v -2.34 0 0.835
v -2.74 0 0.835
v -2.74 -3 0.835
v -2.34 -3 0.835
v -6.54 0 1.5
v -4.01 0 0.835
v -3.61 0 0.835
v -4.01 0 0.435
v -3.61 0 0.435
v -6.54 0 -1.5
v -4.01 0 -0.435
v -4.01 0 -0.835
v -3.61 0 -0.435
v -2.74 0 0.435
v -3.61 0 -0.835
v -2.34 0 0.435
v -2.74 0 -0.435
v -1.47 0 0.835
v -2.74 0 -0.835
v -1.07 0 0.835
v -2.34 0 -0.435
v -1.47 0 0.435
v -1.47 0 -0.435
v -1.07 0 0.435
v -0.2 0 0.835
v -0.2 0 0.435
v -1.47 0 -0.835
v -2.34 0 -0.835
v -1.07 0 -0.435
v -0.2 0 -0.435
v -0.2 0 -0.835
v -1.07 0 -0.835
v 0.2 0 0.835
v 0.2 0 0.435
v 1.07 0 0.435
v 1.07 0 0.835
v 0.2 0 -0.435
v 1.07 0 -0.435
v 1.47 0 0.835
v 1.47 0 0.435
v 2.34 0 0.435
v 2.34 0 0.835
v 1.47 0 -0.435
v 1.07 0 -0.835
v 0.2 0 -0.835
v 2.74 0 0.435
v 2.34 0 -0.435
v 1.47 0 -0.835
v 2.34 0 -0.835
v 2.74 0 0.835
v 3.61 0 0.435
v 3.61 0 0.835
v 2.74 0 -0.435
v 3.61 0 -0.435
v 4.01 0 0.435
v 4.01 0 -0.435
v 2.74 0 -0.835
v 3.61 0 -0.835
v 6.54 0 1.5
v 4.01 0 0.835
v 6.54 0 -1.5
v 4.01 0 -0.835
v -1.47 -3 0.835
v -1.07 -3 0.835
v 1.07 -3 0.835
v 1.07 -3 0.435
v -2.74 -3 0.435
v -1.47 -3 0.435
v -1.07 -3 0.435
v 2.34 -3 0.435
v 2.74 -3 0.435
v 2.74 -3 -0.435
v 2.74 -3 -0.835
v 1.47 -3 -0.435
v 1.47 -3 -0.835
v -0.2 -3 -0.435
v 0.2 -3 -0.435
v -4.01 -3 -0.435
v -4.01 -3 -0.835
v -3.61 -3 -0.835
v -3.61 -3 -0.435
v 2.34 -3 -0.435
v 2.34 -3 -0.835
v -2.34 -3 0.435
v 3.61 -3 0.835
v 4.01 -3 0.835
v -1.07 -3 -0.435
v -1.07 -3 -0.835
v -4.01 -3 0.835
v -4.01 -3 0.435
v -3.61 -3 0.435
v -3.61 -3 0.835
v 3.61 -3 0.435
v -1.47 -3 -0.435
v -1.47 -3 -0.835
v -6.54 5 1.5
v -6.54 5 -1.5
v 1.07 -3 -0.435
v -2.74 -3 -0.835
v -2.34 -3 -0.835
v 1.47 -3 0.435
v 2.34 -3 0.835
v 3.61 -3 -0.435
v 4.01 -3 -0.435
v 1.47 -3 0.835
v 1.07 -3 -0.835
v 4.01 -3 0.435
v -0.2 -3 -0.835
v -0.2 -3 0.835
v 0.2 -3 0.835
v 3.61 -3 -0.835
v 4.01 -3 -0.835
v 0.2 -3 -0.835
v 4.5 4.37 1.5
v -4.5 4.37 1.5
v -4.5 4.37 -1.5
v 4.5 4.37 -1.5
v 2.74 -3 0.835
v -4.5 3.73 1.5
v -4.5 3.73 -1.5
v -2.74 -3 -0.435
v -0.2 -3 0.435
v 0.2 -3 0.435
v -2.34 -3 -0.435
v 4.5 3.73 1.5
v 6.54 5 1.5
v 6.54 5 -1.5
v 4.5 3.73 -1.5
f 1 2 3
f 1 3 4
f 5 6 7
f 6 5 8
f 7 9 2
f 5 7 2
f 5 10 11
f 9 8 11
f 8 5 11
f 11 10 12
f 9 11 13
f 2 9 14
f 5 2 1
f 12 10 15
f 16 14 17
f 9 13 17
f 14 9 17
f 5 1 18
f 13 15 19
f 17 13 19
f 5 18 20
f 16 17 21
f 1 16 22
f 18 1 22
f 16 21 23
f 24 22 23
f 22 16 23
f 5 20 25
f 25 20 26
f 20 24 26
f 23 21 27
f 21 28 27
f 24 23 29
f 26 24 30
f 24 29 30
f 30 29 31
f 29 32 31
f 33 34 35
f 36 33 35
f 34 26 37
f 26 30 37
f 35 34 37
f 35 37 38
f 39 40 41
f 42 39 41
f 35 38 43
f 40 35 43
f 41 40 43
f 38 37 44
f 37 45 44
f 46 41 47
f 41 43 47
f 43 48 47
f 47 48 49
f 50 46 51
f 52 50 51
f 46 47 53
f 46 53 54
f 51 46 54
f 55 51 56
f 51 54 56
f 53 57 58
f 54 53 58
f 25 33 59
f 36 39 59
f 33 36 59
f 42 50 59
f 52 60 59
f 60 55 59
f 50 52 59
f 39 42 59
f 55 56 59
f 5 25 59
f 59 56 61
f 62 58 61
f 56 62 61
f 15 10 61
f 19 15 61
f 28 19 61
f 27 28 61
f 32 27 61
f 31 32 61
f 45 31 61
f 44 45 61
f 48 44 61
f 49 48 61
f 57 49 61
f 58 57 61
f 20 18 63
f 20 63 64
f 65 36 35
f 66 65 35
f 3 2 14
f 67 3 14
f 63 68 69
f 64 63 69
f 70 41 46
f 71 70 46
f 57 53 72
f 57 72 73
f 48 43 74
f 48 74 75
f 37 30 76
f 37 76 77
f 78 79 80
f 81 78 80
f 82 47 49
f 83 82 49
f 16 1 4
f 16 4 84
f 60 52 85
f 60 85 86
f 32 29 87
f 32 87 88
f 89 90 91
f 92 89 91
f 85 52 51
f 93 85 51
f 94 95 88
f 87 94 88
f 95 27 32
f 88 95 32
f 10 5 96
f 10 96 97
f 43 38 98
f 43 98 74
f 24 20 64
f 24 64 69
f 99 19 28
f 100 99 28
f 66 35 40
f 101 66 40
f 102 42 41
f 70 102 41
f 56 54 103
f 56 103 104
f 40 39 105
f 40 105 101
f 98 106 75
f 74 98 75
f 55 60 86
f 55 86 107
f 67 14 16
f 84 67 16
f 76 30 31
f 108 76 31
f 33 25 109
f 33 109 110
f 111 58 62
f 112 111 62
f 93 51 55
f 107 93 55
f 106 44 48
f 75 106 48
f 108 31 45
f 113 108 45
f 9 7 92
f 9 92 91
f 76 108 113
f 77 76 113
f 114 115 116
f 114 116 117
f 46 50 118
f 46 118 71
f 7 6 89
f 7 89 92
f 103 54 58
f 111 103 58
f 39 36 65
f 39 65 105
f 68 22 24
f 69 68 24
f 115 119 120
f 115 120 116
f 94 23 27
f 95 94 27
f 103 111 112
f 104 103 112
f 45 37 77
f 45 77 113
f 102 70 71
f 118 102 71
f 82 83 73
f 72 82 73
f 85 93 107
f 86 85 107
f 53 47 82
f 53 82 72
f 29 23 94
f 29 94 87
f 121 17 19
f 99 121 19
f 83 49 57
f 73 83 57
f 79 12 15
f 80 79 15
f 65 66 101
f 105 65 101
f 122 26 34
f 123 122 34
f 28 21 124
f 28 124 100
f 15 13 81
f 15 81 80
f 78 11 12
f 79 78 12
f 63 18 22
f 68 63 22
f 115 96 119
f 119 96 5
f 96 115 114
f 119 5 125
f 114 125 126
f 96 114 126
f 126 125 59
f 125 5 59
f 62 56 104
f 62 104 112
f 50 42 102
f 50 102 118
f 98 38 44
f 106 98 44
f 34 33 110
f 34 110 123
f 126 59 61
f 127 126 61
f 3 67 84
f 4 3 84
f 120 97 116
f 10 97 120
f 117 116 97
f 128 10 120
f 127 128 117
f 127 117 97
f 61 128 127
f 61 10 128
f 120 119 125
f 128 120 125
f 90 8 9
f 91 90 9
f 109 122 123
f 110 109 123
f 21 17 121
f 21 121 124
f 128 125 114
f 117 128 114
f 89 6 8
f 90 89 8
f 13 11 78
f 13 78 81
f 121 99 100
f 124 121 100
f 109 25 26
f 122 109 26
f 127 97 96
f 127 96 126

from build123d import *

# Parameters (mm, degrees)
SKETCH1_W              = 0.4
SKETCH1_H              = 0.4
BOSS_EXTRUDE1_DEPTH    = 3
BOSS_EXTRUDE1_2_DEPTH  = 3
BOSS_EXTRUDE1_3_DEPTH  = 3
BOSS_EXTRUDE1_4_DEPTH  = 3
BOSS_EXTRUDE1_5_DEPTH  = 3
BOSS_EXTRUDE1_6_DEPTH  = 3
BOSS_EXTRUDE1_7_DEPTH  = 3
BOSS_EXTRUDE1_8_DEPTH  = 3
BOSS_EXTRUDE1_9_DEPTH  = 3
BOSS_EXTRUDE1_10_DEPTH = 3
BOSS_EXTRUDE1_11_DEPTH = 3
BOSS_EXTRUDE1_12_DEPTH = 3
BOSS_EXTRUDE1_13_DEPTH = 3
BOSS_EXTRUDE1_14_DEPTH = 3
SKETCH2_W              = 13.08
SKETCH2_H              = 3
BOSS_EXTRUDE2_DEPTH    = 5
SKETCH3_W              = 9
SKETCH3_H              = 0.64
CUT_EXTRUDE1_DEPTH     = 9.761940424


with BuildPart() as part:
    # Sketch1 → Boss-Extrude1 (new body)
    with BuildSketch(Plane(origin=(0, 0, 0), x_dir=(1, 0, 0), z_dir=(0, 1, 0))):
        with Locations((-2.54, -0.635)):
            Rectangle(SKETCH1_W, SKETCH1_H)
    extrude(amount=-BOSS_EXTRUDE1_DEPTH)



with BuildPart() as body_2:
    # Sketch1 → Boss-Extrude1 2 (new body)
    with BuildSketch(Plane(origin=(0, 0, 0), x_dir=(1, 0, 0), z_dir=(0, 1, 0))):
        with Locations((-3.81, -0.635)):
            Rectangle(SKETCH1_W, SKETCH1_H)
    extrude(amount=-BOSS_EXTRUDE1_2_DEPTH)


with BuildPart() as body_3:
    # Sketch1 → Boss-Extrude1 3 (new body)
    with BuildSketch(Plane(origin=(0, 0, 0), x_dir=(1, 0, 0), z_dir=(0, 1, 0))):
        with Locations((-1.27, -0.635)):
            Rectangle(SKETCH1_W, SKETCH1_H)
    extrude(amount=-BOSS_EXTRUDE1_3_DEPTH)


with BuildPart() as body_4:
    # Sketch1 → Boss-Extrude1 4 (new body)
    with BuildSketch(Plane(origin=(0, 0, 0), x_dir=(1, 0, 0), z_dir=(0, 1, 0))):
        with Locations((0, -0.635)):
            Rectangle(SKETCH1_W, SKETCH1_H)
    extrude(amount=-BOSS_EXTRUDE1_4_DEPTH)


with BuildPart() as body_5:
    # Sketch1 → Boss-Extrude1 5 (new body)
    with BuildSketch(Plane(origin=(0, 0, 0), x_dir=(1, 0, 0), z_dir=(0, 1, 0))):
        with Locations((1.27, -0.635)):
            Rectangle(SKETCH1_W, SKETCH1_H)
    extrude(amount=-BOSS_EXTRUDE1_5_DEPTH)


with BuildPart() as body_6:
    # Sketch1 → Boss-Extrude1 6 (new body)
    with BuildSketch(Plane(origin=(0, 0, 0), x_dir=(1, 0, 0), z_dir=(0, 1, 0))):
        with Locations((2.54, -0.635)):
            Rectangle(SKETCH1_W, SKETCH1_H)
    extrude(amount=-BOSS_EXTRUDE1_6_DEPTH)


with BuildPart() as body_7:
    # Sketch1 → Boss-Extrude1 7 (new body)
    with BuildSketch(Plane(origin=(0, 0, 0), x_dir=(1, 0, 0), z_dir=(0, 1, 0))):
        with Locations((3.81, -0.635)):
            Rectangle(SKETCH1_W, SKETCH1_H)
    extrude(amount=-BOSS_EXTRUDE1_7_DEPTH)


with BuildPart() as body_8:
    # Sketch1 → Boss-Extrude1 8 (new body)
    with BuildSketch(Plane(origin=(0, 0, 0), x_dir=(1, 0, 0), z_dir=(0, 1, 0))):
        with Locations((-2.54, 0.635)):
            Rectangle(SKETCH1_W, SKETCH1_H)
    extrude(amount=-BOSS_EXTRUDE1_8_DEPTH)


with BuildPart() as body_9:
    # Sketch1 → Boss-Extrude1 9 (new body)
    with BuildSketch(Plane(origin=(0, 0, 0), x_dir=(1, 0, 0), z_dir=(0, 1, 0))):
        with Locations((-1.27, 0.635)):
            Rectangle(SKETCH1_W, SKETCH1_H)
    extrude(amount=-BOSS_EXTRUDE1_9_DEPTH)


with BuildPart() as body_10:
    # Sketch1 → Boss-Extrude1 10 (new body)
    with BuildSketch(Plane(origin=(0, 0, 0), x_dir=(1, 0, 0), z_dir=(0, 1, 0))):
        with Locations((0, 0.635)):
            Rectangle(SKETCH1_W, SKETCH1_H)
    extrude(amount=-BOSS_EXTRUDE1_10_DEPTH)


with BuildPart() as body_11:
    # Sketch1 → Boss-Extrude1 11 (new body)
    with BuildSketch(Plane(origin=(0, 0, 0), x_dir=(1, 0, 0), z_dir=(0, 1, 0))):
        with Locations((1.27, 0.635)):
            Rectangle(SKETCH1_W, SKETCH1_H)
    extrude(amount=-BOSS_EXTRUDE1_11_DEPTH)


with BuildPart() as body_12:
    # Sketch1 → Boss-Extrude1 12 (new body)
    with BuildSketch(Plane(origin=(0, 0, 0), x_dir=(1, 0, 0), z_dir=(0, 1, 0))):
        with Locations((2.54, 0.635)):
            Rectangle(SKETCH1_W, SKETCH1_H)
    extrude(amount=-BOSS_EXTRUDE1_12_DEPTH)


with BuildPart() as body_13:
    # Sketch1 → Boss-Extrude1 13 (new body)
    with BuildSketch(Plane(origin=(0, 0, 0), x_dir=(1, 0, 0), z_dir=(0, 1, 0))):
        with Locations((3.81, 0.635)):
            Rectangle(SKETCH1_W, SKETCH1_H)
    extrude(amount=-BOSS_EXTRUDE1_13_DEPTH)


with BuildPart() as body_14:
    # Sketch1 → Boss-Extrude1 14 (new body)
    with BuildSketch(Plane(origin=(0, 0, 0), x_dir=(1, 0, 0), z_dir=(0, 1, 0))):
        with Locations((-3.81, 0.635)):
            Rectangle(SKETCH1_W, SKETCH1_H)
    extrude(amount=-BOSS_EXTRUDE1_14_DEPTH)


with BuildPart() as part_1:
    add(part.part)

    add(body_2.part)  # Boss-Extrude2 merges body 2

    add(body_3.part)  # Boss-Extrude2 merges body 3

    add(body_4.part)  # Boss-Extrude2 merges body 4

    add(body_5.part)  # Boss-Extrude2 merges body 5

    add(body_6.part)  # Boss-Extrude2 merges body 6

    add(body_7.part)  # Boss-Extrude2 merges body 7

    add(body_8.part)  # Boss-Extrude2 merges body 8

    add(body_9.part)  # Boss-Extrude2 merges body 9

    add(body_10.part)  # Boss-Extrude2 merges body 10

    add(body_11.part)  # Boss-Extrude2 merges body 11

    add(body_12.part)  # Boss-Extrude2 merges body 12

    add(body_13.part)  # Boss-Extrude2 merges body 13

    add(body_14.part)  # Boss-Extrude2 merges body 14
    # Sketch2 → Boss-Extrude2 (add)
    with BuildSketch(Plane(origin=(0, 0, 0), x_dir=(1, 0, 0), z_dir=(0, 1, 0))):
        Rectangle(SKETCH2_W, SKETCH2_H)
    extrude(amount=BOSS_EXTRUDE2_DEPTH)

    # Sketch3 → Cut-Extrude1 (cut, through all)
    with BuildSketch(Plane.XY.offset(1.5)):
        with Locations((0, 4.05)):
            Rectangle(SKETCH3_W, SKETCH3_H)
    extrude(amount=-CUT_EXTRUDE1_DEPTH, mode=Mode.SUBTRACT)


solid = part_1.part
